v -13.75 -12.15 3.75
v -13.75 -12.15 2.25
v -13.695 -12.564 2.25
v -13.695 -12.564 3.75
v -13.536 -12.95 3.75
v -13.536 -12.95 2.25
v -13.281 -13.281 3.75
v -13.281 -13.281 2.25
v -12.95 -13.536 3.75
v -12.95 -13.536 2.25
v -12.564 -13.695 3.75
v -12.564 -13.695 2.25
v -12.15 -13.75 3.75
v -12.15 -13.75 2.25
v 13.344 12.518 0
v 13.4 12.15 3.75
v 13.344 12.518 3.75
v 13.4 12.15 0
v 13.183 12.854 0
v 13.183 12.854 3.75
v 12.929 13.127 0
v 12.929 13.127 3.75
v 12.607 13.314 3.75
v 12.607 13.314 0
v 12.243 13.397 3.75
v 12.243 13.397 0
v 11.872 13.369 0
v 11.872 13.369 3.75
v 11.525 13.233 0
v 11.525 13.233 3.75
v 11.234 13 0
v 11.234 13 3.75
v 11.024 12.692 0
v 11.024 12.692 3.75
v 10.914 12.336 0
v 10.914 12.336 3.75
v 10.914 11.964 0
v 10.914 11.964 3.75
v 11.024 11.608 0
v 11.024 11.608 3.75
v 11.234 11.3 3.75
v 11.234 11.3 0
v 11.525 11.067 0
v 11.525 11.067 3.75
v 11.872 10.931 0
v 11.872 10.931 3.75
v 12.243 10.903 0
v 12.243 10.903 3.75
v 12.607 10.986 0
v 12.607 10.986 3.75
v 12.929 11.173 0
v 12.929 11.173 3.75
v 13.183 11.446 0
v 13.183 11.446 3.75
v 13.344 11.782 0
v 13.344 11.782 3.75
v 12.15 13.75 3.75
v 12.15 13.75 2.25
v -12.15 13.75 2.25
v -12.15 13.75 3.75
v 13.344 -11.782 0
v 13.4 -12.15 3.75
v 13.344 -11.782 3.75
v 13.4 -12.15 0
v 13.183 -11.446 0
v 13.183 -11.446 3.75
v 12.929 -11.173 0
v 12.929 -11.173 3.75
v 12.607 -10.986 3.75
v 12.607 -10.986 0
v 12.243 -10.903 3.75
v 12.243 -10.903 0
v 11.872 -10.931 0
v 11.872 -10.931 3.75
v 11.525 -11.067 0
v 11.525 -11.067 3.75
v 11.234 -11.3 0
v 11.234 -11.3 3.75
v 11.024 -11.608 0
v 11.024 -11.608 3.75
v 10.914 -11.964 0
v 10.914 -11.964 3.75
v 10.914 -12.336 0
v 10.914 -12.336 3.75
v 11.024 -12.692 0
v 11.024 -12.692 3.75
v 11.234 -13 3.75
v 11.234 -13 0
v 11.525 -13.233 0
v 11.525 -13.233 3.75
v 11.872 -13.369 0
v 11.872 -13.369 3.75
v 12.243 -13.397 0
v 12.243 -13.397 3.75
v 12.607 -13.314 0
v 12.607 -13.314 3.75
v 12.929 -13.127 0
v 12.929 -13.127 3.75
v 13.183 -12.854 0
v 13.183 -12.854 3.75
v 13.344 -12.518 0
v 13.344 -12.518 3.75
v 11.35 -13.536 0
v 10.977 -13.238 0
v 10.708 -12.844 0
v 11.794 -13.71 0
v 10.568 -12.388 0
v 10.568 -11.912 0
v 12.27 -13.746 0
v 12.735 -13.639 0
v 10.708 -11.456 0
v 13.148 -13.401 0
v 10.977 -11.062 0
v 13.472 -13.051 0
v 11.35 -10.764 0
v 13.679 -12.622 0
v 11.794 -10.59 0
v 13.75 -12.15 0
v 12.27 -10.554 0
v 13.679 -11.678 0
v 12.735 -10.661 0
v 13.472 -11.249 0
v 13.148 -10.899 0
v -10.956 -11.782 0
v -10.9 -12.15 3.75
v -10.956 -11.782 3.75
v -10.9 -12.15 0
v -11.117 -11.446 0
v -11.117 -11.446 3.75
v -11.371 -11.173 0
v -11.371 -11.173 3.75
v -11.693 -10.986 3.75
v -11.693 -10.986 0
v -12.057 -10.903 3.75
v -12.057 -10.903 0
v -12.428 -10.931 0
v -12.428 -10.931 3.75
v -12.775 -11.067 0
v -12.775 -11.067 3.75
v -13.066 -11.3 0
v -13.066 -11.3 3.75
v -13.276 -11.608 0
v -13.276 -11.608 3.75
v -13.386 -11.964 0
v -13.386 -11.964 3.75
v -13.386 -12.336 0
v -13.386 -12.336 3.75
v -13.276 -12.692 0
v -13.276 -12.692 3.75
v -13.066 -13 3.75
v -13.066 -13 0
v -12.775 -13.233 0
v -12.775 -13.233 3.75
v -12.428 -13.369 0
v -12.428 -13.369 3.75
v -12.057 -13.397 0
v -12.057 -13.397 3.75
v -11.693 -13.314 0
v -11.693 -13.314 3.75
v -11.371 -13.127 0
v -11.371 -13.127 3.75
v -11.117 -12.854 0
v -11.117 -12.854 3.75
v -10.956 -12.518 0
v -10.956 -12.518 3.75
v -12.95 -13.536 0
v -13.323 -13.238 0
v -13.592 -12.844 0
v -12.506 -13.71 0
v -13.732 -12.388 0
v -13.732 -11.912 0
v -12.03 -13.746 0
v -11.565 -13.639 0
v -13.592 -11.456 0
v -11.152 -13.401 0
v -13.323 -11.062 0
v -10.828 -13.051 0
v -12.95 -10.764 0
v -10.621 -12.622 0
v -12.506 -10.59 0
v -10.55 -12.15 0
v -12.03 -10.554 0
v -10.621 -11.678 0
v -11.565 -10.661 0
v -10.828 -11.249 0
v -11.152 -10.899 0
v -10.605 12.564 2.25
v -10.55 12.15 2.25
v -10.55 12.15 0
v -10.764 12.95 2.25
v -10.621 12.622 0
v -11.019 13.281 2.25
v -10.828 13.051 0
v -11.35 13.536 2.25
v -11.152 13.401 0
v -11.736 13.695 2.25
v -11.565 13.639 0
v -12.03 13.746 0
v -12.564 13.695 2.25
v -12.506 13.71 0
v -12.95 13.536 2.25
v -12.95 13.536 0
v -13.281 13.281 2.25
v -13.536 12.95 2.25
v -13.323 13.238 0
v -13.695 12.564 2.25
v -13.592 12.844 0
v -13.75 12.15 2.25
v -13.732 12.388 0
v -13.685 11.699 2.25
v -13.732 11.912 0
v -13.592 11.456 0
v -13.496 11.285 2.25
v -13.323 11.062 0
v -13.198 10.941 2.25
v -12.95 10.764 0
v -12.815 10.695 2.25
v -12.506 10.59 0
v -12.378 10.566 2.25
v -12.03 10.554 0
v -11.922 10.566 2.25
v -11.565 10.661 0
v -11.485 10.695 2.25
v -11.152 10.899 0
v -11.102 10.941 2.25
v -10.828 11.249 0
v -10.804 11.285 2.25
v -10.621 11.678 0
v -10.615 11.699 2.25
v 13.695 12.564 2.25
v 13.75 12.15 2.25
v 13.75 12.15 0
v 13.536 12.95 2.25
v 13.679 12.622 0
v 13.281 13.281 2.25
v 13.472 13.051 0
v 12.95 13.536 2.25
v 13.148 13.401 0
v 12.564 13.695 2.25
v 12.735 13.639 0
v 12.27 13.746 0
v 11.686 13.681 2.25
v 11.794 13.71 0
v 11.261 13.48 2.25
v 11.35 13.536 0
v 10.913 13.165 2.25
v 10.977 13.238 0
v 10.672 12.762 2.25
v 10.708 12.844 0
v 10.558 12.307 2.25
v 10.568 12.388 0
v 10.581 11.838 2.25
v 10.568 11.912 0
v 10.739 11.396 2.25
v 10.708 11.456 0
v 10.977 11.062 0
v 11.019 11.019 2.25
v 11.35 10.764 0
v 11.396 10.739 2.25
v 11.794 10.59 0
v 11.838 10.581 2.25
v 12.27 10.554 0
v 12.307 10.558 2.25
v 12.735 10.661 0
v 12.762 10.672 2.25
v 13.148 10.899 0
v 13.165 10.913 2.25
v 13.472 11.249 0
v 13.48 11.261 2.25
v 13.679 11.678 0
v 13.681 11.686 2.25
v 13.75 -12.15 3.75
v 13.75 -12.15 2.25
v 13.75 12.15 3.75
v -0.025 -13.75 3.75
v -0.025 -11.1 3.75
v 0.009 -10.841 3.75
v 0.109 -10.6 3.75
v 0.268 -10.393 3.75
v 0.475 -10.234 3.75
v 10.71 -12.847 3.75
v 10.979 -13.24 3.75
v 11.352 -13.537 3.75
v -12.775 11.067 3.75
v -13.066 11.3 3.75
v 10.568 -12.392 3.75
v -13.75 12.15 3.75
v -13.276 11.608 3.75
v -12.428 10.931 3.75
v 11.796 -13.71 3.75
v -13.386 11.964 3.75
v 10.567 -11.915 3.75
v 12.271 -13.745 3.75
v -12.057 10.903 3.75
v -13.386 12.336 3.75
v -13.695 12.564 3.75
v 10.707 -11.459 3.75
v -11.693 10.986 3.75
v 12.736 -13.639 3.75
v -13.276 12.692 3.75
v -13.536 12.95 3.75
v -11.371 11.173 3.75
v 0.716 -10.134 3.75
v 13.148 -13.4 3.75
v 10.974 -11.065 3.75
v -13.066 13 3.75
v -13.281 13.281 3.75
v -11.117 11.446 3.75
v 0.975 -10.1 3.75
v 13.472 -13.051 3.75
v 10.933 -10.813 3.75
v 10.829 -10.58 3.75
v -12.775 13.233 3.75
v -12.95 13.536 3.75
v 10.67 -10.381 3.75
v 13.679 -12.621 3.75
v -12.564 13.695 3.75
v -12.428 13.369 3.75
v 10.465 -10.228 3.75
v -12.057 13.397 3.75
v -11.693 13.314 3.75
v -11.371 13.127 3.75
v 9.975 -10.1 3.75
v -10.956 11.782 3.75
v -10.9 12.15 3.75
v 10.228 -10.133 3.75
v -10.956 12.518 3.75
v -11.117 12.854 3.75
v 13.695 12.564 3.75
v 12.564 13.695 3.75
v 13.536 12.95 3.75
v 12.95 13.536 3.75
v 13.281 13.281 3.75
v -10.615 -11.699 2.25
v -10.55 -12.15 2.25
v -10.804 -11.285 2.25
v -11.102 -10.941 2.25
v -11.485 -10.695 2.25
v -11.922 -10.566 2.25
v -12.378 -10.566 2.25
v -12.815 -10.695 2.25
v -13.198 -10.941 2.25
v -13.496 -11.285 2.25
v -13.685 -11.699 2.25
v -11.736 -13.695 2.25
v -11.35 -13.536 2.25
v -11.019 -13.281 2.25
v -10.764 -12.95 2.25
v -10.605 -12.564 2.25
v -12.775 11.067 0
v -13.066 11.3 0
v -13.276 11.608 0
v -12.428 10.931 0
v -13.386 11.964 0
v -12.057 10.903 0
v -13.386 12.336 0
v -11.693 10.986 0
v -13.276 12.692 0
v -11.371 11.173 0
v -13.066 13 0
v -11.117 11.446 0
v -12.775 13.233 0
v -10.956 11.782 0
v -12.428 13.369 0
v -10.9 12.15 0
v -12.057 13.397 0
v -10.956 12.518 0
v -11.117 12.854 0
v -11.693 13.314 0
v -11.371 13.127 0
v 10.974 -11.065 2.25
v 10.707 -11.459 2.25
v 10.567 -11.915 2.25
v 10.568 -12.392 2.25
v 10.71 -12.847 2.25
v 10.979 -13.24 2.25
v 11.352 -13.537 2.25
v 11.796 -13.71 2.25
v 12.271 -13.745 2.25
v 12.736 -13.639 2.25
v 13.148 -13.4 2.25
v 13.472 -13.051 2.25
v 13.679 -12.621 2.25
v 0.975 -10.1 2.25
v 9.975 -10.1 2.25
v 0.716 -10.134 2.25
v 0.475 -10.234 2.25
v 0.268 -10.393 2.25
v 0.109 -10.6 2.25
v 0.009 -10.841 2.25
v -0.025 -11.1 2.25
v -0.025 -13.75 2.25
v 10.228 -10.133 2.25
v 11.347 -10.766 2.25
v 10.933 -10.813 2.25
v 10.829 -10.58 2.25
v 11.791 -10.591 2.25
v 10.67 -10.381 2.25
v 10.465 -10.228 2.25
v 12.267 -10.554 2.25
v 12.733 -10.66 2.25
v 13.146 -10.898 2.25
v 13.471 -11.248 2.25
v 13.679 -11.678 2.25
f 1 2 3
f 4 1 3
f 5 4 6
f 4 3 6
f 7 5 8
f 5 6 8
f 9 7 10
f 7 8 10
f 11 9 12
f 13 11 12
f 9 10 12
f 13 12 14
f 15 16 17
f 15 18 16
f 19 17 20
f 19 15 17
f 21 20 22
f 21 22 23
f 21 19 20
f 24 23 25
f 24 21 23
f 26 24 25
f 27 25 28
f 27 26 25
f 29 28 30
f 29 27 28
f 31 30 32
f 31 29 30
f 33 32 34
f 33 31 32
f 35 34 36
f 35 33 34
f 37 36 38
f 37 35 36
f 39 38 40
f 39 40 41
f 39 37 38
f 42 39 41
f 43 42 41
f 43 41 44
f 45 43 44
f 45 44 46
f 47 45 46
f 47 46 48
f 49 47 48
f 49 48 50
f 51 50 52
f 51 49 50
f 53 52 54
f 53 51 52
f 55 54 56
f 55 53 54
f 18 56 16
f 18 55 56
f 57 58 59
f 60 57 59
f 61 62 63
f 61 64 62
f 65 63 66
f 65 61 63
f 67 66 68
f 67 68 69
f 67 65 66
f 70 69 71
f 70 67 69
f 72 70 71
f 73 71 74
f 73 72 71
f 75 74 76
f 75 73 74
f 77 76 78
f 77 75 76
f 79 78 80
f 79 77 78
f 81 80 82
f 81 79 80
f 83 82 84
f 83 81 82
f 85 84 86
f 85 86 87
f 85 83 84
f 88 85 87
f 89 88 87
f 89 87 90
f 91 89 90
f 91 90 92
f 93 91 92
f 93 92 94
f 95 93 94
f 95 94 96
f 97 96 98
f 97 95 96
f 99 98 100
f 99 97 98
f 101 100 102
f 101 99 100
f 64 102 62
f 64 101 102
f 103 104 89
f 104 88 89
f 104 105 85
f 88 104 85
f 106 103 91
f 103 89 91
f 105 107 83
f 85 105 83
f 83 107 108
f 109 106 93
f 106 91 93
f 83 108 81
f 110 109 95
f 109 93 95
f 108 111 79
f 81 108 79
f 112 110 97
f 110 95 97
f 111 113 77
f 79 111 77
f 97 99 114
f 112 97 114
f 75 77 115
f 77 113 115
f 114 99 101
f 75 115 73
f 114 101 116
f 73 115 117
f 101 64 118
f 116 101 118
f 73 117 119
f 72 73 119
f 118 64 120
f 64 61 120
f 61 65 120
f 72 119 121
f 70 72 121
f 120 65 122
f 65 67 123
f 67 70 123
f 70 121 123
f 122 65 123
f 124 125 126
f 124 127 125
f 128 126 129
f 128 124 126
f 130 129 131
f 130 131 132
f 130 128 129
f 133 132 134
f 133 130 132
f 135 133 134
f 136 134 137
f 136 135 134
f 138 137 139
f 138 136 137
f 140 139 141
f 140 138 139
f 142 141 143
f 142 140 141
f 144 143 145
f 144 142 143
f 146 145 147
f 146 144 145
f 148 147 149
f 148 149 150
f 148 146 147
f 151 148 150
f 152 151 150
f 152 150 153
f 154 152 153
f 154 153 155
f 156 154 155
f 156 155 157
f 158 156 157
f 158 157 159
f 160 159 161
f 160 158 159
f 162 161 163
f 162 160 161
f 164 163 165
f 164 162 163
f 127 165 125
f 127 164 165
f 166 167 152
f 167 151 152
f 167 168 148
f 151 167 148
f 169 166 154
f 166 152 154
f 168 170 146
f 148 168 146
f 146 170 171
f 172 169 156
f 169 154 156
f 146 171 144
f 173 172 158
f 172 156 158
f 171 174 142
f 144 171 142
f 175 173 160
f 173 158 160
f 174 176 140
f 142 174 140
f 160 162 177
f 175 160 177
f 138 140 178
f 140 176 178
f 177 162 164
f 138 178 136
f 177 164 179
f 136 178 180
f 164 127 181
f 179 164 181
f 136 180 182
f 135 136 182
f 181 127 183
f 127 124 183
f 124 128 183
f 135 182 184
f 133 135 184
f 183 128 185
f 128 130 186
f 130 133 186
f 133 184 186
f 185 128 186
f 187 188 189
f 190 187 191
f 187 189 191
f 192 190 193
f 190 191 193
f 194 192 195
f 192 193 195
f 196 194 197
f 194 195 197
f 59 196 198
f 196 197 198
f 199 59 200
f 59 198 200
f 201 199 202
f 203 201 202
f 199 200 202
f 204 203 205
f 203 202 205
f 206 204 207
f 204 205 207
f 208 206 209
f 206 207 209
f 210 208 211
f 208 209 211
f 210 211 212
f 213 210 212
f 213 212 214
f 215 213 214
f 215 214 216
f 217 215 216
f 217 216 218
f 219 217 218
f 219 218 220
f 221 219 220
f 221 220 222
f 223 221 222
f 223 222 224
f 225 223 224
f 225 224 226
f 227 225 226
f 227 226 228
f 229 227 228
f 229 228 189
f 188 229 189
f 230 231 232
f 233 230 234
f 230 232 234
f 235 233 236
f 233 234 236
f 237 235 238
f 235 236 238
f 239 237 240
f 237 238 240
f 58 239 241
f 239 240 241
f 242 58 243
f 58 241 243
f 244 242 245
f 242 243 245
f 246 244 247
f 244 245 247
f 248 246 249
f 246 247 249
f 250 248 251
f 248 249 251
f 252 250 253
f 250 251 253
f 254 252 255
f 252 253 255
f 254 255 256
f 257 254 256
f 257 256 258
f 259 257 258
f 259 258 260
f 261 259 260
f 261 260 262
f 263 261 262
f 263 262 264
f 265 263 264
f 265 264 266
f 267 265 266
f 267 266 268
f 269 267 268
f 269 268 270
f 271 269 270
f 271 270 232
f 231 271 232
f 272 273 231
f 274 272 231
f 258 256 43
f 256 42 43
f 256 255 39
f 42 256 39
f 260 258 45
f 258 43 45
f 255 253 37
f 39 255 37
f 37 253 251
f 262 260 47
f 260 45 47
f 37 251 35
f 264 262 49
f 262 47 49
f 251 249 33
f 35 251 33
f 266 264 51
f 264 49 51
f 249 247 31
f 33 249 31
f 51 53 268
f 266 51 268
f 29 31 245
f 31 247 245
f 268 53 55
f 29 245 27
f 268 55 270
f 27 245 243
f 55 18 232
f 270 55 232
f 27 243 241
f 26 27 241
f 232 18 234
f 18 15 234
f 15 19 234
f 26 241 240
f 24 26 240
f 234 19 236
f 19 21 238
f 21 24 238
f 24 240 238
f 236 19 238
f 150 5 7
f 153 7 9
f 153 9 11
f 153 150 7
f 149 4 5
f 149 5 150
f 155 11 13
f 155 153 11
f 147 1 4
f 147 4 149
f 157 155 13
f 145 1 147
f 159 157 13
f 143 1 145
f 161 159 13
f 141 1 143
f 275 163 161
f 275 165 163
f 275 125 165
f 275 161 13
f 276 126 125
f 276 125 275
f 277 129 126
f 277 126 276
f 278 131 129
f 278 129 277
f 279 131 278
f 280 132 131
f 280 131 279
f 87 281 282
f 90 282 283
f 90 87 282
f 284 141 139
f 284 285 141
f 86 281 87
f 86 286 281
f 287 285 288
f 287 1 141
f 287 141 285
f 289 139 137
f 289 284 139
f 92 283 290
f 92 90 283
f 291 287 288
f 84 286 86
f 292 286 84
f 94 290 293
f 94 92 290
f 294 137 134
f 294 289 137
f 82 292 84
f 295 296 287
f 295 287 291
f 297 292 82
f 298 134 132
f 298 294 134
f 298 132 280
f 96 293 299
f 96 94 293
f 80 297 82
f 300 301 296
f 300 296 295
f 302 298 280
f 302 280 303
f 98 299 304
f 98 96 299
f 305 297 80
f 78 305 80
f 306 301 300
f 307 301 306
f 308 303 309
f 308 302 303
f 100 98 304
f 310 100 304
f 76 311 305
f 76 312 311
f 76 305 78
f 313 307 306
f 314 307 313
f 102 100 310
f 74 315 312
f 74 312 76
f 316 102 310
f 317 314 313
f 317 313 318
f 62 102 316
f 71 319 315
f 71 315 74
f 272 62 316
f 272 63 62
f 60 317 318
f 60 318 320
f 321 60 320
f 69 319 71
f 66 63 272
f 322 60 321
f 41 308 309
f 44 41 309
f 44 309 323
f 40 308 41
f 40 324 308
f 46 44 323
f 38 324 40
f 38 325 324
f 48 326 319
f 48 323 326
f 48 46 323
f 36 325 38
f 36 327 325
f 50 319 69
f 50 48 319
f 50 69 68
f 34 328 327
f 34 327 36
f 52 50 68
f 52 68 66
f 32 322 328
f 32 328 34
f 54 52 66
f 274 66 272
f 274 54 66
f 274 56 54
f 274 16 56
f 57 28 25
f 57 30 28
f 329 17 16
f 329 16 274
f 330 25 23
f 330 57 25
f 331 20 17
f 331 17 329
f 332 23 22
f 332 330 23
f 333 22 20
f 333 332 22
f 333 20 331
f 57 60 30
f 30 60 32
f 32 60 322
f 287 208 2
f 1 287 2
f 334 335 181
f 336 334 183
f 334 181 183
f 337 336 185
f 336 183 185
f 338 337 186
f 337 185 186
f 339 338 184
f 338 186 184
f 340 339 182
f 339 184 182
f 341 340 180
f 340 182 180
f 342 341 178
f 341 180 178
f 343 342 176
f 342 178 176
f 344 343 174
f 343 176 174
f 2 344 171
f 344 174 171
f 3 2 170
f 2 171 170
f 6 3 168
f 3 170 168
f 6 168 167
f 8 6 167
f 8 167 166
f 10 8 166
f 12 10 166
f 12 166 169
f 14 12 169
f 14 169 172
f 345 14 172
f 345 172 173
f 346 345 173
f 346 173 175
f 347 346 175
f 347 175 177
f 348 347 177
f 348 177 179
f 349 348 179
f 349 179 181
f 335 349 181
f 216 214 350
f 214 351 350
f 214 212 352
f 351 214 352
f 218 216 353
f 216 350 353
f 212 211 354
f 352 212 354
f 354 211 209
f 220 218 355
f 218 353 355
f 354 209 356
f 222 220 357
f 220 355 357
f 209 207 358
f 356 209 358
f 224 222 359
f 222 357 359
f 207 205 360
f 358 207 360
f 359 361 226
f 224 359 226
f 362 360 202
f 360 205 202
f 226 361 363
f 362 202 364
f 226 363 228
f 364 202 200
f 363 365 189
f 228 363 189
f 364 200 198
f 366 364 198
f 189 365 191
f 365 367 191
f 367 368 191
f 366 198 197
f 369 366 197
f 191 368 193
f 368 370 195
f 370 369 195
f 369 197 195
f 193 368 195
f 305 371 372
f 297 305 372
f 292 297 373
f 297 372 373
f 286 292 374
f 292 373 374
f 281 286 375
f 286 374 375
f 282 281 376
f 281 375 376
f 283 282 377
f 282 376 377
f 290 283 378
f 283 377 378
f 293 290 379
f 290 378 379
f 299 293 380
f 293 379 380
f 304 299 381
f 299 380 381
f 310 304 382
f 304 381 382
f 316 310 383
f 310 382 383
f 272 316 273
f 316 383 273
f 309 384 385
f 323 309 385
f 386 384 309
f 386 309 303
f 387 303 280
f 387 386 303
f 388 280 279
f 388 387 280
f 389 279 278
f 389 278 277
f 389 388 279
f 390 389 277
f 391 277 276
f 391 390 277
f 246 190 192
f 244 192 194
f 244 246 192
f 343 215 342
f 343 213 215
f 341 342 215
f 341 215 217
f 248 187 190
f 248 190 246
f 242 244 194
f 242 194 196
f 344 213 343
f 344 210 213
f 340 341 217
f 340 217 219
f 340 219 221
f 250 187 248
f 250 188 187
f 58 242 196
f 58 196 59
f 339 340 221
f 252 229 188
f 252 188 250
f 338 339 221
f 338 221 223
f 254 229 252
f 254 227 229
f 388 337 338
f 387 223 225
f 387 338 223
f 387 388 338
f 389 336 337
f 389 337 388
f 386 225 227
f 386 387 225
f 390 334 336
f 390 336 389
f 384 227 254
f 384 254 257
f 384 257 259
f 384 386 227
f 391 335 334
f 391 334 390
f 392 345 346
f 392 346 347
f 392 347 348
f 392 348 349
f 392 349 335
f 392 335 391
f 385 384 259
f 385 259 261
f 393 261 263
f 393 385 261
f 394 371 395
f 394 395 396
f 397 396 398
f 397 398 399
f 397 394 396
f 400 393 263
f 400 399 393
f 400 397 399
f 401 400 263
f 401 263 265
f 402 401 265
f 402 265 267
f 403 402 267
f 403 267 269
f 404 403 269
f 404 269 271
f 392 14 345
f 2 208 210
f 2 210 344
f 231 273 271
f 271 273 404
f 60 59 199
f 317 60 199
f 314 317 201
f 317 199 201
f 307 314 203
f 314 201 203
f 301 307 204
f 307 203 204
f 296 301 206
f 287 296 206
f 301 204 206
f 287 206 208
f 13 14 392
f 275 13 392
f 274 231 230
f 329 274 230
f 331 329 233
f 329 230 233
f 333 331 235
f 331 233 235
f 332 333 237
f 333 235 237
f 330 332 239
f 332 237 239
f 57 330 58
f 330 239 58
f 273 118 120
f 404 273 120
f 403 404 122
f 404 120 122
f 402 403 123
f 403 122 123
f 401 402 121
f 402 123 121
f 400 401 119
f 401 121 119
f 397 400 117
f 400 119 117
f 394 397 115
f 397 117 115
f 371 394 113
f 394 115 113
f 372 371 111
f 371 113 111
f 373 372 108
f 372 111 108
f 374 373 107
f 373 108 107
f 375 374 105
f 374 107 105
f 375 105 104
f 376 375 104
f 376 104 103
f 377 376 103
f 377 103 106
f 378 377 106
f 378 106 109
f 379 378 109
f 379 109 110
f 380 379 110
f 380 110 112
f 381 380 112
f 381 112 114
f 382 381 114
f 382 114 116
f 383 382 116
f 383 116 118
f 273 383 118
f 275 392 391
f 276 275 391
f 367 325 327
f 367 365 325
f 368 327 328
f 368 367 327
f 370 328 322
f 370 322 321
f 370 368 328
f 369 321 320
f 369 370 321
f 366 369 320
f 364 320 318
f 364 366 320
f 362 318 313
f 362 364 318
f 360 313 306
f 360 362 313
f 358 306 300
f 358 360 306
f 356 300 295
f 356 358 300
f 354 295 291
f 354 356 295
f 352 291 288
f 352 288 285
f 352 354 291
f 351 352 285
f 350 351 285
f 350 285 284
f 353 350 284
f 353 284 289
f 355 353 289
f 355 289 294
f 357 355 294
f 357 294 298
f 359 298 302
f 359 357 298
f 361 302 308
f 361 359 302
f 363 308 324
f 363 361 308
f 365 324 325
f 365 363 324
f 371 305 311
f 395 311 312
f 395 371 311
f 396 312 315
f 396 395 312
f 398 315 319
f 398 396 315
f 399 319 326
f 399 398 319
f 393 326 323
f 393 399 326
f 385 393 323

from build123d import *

# Parameters (mm, degrees)
SKETCH1_R             = 1.6
SKETCH1_R_2           = 1.25
BOSS_EXTRUDE1_DEPTH   = 2.25
BOSS_EXTRUDE1_2_DEPTH = 2.25
BOSS_EXTRUDE1_3_DEPTH = 2.25
BOSS_EXTRUDE1_4_DEPTH = 2.25
SKETCH2_R             = 1.25
BOSS_EXTRUDE2_DEPTH   = 1.5
FILLET1_R             = 1


with BuildPart() as part:
    # Sketch1 → Boss-Extrude1 (new body)
    with BuildSketch(Plane.XY):
        with Locations((-12.15, 12.15)):
            Circle(SKETCH1_R)
        with Locations((-12.15, 12.15)):
            Circle(SKETCH1_R_2, mode=Mode.SUBTRACT)
    extrude(amount=BOSS_EXTRUDE1_DEPTH)



with BuildPart() as body_2:
    # Sketch1 → Boss-Extrude1 2 (new body)
    with BuildSketch(Plane.XY):
        with Locations((12.15, 12.15)):
            Circle(SKETCH1_R)
        with Locations((12.15, 12.15)):
            Circle(SKETCH1_R_2, mode=Mode.SUBTRACT)
    extrude(amount=BOSS_EXTRUDE1_2_DEPTH)


with BuildPart() as body_3:
    # Sketch1 → Boss-Extrude1 3 (new body)
    with BuildSketch(Plane.XY):
        with Locations((12.15, -12.15)):
            Circle(SKETCH1_R)
        with Locations((12.15, -12.15)):
            Circle(SKETCH1_R_2, mode=Mode.SUBTRACT)
    extrude(amount=BOSS_EXTRUDE1_3_DEPTH)


with BuildPart() as body_4:
    # Sketch1 → Boss-Extrude1 4 (new body)
    with BuildSketch(Plane.XY):
        with Locations((-12.15, -12.15)):
            Circle(SKETCH1_R)
        with Locations((-12.15, -12.15)):
            Circle(SKETCH1_R_2, mode=Mode.SUBTRACT)
    extrude(amount=BOSS_EXTRUDE1_4_DEPTH)


with BuildPart() as part_1:
    add(part.part)

    add(body_2.part)  # Boss-Extrude2 merges body 2

    add(body_3.part)  # Boss-Extrude2 merges body 3

    add(body_4.part)  # Boss-Extrude2 merges body 4
    # Sketch2 → Boss-Extrude2 (add)
    with BuildSketch(Plane.XY.offset(2.25)):
        with BuildLine():
            Line((12.15, 13.75), (-12.15, 13.75))
            ThreePointArc((-12.15, 13.75), (-13.28137085, 13.28137085), (-13.75, 12.15))
            Line((-13.75, 12.15), (-13.75, -12.15))
            ThreePointArc((-13.75, -12.15), (-13.28137085, -13.28137085), (-12.15, -13.75))
            Line((-12.15, -13.75), (-0.025, -13.75))
            Line((-0.025, -13.75), (-0.025, -10.1))
            Line((-0.025, -10.1), (10.975, -10.1))
            Line((10.975, -10.1), (10.975, -11.064009669))
            ThreePointArc((10.975, -11.064009669), (11.566904811, -13.639966443), (13.75, -12.15))
            Line((13.75, -12.15), (13.75, 12.15))
            ThreePointArc((13.75, 12.15), (13.28137085, 13.28137085), (12.15, 13.75))
        make_face()
        with Locations((-12.15, 12.15)):
            Circle(SKETCH2_R, mode=Mode.SUBTRACT)
        with Locations((12.15, 12.15)):
            Circle(SKETCH2_R, mode=Mode.SUBTRACT)
        with Locations((-12.15, -12.15)):
            Circle(SKETCH2_R, mode=Mode.SUBTRACT)
        with Locations((12.15, -12.15)):
            Circle(SKETCH2_R, mode=Mode.SUBTRACT)
    extrude(amount=BOSS_EXTRUDE2_DEPTH)

    # Fillet1
    # the kernel refuses this fillet: 1 mm, written as the material it adds along each edge
    with BuildSketch(Plane(origin=(10.975, -10.1, 2.25), x_dir=(-1, 0, 0), z_dir=(0, 0, 1)), Plane(origin=(-0.025, -10.1, 2.25), x_dir=(0, -1, 0), z_dir=(0, 0, 1))) as fillet1_piece_1:
        with BuildLine():
            CenterArc((FILLET1_R, FILLET1_R), FILLET1_R, 180, 90)
            Line((0, FILLET1_R), (0, 0))
            Line((0, 0), (FILLET1_R, 0))
        make_face()
    extrude(amount=1.5)


solid = part_1.part
